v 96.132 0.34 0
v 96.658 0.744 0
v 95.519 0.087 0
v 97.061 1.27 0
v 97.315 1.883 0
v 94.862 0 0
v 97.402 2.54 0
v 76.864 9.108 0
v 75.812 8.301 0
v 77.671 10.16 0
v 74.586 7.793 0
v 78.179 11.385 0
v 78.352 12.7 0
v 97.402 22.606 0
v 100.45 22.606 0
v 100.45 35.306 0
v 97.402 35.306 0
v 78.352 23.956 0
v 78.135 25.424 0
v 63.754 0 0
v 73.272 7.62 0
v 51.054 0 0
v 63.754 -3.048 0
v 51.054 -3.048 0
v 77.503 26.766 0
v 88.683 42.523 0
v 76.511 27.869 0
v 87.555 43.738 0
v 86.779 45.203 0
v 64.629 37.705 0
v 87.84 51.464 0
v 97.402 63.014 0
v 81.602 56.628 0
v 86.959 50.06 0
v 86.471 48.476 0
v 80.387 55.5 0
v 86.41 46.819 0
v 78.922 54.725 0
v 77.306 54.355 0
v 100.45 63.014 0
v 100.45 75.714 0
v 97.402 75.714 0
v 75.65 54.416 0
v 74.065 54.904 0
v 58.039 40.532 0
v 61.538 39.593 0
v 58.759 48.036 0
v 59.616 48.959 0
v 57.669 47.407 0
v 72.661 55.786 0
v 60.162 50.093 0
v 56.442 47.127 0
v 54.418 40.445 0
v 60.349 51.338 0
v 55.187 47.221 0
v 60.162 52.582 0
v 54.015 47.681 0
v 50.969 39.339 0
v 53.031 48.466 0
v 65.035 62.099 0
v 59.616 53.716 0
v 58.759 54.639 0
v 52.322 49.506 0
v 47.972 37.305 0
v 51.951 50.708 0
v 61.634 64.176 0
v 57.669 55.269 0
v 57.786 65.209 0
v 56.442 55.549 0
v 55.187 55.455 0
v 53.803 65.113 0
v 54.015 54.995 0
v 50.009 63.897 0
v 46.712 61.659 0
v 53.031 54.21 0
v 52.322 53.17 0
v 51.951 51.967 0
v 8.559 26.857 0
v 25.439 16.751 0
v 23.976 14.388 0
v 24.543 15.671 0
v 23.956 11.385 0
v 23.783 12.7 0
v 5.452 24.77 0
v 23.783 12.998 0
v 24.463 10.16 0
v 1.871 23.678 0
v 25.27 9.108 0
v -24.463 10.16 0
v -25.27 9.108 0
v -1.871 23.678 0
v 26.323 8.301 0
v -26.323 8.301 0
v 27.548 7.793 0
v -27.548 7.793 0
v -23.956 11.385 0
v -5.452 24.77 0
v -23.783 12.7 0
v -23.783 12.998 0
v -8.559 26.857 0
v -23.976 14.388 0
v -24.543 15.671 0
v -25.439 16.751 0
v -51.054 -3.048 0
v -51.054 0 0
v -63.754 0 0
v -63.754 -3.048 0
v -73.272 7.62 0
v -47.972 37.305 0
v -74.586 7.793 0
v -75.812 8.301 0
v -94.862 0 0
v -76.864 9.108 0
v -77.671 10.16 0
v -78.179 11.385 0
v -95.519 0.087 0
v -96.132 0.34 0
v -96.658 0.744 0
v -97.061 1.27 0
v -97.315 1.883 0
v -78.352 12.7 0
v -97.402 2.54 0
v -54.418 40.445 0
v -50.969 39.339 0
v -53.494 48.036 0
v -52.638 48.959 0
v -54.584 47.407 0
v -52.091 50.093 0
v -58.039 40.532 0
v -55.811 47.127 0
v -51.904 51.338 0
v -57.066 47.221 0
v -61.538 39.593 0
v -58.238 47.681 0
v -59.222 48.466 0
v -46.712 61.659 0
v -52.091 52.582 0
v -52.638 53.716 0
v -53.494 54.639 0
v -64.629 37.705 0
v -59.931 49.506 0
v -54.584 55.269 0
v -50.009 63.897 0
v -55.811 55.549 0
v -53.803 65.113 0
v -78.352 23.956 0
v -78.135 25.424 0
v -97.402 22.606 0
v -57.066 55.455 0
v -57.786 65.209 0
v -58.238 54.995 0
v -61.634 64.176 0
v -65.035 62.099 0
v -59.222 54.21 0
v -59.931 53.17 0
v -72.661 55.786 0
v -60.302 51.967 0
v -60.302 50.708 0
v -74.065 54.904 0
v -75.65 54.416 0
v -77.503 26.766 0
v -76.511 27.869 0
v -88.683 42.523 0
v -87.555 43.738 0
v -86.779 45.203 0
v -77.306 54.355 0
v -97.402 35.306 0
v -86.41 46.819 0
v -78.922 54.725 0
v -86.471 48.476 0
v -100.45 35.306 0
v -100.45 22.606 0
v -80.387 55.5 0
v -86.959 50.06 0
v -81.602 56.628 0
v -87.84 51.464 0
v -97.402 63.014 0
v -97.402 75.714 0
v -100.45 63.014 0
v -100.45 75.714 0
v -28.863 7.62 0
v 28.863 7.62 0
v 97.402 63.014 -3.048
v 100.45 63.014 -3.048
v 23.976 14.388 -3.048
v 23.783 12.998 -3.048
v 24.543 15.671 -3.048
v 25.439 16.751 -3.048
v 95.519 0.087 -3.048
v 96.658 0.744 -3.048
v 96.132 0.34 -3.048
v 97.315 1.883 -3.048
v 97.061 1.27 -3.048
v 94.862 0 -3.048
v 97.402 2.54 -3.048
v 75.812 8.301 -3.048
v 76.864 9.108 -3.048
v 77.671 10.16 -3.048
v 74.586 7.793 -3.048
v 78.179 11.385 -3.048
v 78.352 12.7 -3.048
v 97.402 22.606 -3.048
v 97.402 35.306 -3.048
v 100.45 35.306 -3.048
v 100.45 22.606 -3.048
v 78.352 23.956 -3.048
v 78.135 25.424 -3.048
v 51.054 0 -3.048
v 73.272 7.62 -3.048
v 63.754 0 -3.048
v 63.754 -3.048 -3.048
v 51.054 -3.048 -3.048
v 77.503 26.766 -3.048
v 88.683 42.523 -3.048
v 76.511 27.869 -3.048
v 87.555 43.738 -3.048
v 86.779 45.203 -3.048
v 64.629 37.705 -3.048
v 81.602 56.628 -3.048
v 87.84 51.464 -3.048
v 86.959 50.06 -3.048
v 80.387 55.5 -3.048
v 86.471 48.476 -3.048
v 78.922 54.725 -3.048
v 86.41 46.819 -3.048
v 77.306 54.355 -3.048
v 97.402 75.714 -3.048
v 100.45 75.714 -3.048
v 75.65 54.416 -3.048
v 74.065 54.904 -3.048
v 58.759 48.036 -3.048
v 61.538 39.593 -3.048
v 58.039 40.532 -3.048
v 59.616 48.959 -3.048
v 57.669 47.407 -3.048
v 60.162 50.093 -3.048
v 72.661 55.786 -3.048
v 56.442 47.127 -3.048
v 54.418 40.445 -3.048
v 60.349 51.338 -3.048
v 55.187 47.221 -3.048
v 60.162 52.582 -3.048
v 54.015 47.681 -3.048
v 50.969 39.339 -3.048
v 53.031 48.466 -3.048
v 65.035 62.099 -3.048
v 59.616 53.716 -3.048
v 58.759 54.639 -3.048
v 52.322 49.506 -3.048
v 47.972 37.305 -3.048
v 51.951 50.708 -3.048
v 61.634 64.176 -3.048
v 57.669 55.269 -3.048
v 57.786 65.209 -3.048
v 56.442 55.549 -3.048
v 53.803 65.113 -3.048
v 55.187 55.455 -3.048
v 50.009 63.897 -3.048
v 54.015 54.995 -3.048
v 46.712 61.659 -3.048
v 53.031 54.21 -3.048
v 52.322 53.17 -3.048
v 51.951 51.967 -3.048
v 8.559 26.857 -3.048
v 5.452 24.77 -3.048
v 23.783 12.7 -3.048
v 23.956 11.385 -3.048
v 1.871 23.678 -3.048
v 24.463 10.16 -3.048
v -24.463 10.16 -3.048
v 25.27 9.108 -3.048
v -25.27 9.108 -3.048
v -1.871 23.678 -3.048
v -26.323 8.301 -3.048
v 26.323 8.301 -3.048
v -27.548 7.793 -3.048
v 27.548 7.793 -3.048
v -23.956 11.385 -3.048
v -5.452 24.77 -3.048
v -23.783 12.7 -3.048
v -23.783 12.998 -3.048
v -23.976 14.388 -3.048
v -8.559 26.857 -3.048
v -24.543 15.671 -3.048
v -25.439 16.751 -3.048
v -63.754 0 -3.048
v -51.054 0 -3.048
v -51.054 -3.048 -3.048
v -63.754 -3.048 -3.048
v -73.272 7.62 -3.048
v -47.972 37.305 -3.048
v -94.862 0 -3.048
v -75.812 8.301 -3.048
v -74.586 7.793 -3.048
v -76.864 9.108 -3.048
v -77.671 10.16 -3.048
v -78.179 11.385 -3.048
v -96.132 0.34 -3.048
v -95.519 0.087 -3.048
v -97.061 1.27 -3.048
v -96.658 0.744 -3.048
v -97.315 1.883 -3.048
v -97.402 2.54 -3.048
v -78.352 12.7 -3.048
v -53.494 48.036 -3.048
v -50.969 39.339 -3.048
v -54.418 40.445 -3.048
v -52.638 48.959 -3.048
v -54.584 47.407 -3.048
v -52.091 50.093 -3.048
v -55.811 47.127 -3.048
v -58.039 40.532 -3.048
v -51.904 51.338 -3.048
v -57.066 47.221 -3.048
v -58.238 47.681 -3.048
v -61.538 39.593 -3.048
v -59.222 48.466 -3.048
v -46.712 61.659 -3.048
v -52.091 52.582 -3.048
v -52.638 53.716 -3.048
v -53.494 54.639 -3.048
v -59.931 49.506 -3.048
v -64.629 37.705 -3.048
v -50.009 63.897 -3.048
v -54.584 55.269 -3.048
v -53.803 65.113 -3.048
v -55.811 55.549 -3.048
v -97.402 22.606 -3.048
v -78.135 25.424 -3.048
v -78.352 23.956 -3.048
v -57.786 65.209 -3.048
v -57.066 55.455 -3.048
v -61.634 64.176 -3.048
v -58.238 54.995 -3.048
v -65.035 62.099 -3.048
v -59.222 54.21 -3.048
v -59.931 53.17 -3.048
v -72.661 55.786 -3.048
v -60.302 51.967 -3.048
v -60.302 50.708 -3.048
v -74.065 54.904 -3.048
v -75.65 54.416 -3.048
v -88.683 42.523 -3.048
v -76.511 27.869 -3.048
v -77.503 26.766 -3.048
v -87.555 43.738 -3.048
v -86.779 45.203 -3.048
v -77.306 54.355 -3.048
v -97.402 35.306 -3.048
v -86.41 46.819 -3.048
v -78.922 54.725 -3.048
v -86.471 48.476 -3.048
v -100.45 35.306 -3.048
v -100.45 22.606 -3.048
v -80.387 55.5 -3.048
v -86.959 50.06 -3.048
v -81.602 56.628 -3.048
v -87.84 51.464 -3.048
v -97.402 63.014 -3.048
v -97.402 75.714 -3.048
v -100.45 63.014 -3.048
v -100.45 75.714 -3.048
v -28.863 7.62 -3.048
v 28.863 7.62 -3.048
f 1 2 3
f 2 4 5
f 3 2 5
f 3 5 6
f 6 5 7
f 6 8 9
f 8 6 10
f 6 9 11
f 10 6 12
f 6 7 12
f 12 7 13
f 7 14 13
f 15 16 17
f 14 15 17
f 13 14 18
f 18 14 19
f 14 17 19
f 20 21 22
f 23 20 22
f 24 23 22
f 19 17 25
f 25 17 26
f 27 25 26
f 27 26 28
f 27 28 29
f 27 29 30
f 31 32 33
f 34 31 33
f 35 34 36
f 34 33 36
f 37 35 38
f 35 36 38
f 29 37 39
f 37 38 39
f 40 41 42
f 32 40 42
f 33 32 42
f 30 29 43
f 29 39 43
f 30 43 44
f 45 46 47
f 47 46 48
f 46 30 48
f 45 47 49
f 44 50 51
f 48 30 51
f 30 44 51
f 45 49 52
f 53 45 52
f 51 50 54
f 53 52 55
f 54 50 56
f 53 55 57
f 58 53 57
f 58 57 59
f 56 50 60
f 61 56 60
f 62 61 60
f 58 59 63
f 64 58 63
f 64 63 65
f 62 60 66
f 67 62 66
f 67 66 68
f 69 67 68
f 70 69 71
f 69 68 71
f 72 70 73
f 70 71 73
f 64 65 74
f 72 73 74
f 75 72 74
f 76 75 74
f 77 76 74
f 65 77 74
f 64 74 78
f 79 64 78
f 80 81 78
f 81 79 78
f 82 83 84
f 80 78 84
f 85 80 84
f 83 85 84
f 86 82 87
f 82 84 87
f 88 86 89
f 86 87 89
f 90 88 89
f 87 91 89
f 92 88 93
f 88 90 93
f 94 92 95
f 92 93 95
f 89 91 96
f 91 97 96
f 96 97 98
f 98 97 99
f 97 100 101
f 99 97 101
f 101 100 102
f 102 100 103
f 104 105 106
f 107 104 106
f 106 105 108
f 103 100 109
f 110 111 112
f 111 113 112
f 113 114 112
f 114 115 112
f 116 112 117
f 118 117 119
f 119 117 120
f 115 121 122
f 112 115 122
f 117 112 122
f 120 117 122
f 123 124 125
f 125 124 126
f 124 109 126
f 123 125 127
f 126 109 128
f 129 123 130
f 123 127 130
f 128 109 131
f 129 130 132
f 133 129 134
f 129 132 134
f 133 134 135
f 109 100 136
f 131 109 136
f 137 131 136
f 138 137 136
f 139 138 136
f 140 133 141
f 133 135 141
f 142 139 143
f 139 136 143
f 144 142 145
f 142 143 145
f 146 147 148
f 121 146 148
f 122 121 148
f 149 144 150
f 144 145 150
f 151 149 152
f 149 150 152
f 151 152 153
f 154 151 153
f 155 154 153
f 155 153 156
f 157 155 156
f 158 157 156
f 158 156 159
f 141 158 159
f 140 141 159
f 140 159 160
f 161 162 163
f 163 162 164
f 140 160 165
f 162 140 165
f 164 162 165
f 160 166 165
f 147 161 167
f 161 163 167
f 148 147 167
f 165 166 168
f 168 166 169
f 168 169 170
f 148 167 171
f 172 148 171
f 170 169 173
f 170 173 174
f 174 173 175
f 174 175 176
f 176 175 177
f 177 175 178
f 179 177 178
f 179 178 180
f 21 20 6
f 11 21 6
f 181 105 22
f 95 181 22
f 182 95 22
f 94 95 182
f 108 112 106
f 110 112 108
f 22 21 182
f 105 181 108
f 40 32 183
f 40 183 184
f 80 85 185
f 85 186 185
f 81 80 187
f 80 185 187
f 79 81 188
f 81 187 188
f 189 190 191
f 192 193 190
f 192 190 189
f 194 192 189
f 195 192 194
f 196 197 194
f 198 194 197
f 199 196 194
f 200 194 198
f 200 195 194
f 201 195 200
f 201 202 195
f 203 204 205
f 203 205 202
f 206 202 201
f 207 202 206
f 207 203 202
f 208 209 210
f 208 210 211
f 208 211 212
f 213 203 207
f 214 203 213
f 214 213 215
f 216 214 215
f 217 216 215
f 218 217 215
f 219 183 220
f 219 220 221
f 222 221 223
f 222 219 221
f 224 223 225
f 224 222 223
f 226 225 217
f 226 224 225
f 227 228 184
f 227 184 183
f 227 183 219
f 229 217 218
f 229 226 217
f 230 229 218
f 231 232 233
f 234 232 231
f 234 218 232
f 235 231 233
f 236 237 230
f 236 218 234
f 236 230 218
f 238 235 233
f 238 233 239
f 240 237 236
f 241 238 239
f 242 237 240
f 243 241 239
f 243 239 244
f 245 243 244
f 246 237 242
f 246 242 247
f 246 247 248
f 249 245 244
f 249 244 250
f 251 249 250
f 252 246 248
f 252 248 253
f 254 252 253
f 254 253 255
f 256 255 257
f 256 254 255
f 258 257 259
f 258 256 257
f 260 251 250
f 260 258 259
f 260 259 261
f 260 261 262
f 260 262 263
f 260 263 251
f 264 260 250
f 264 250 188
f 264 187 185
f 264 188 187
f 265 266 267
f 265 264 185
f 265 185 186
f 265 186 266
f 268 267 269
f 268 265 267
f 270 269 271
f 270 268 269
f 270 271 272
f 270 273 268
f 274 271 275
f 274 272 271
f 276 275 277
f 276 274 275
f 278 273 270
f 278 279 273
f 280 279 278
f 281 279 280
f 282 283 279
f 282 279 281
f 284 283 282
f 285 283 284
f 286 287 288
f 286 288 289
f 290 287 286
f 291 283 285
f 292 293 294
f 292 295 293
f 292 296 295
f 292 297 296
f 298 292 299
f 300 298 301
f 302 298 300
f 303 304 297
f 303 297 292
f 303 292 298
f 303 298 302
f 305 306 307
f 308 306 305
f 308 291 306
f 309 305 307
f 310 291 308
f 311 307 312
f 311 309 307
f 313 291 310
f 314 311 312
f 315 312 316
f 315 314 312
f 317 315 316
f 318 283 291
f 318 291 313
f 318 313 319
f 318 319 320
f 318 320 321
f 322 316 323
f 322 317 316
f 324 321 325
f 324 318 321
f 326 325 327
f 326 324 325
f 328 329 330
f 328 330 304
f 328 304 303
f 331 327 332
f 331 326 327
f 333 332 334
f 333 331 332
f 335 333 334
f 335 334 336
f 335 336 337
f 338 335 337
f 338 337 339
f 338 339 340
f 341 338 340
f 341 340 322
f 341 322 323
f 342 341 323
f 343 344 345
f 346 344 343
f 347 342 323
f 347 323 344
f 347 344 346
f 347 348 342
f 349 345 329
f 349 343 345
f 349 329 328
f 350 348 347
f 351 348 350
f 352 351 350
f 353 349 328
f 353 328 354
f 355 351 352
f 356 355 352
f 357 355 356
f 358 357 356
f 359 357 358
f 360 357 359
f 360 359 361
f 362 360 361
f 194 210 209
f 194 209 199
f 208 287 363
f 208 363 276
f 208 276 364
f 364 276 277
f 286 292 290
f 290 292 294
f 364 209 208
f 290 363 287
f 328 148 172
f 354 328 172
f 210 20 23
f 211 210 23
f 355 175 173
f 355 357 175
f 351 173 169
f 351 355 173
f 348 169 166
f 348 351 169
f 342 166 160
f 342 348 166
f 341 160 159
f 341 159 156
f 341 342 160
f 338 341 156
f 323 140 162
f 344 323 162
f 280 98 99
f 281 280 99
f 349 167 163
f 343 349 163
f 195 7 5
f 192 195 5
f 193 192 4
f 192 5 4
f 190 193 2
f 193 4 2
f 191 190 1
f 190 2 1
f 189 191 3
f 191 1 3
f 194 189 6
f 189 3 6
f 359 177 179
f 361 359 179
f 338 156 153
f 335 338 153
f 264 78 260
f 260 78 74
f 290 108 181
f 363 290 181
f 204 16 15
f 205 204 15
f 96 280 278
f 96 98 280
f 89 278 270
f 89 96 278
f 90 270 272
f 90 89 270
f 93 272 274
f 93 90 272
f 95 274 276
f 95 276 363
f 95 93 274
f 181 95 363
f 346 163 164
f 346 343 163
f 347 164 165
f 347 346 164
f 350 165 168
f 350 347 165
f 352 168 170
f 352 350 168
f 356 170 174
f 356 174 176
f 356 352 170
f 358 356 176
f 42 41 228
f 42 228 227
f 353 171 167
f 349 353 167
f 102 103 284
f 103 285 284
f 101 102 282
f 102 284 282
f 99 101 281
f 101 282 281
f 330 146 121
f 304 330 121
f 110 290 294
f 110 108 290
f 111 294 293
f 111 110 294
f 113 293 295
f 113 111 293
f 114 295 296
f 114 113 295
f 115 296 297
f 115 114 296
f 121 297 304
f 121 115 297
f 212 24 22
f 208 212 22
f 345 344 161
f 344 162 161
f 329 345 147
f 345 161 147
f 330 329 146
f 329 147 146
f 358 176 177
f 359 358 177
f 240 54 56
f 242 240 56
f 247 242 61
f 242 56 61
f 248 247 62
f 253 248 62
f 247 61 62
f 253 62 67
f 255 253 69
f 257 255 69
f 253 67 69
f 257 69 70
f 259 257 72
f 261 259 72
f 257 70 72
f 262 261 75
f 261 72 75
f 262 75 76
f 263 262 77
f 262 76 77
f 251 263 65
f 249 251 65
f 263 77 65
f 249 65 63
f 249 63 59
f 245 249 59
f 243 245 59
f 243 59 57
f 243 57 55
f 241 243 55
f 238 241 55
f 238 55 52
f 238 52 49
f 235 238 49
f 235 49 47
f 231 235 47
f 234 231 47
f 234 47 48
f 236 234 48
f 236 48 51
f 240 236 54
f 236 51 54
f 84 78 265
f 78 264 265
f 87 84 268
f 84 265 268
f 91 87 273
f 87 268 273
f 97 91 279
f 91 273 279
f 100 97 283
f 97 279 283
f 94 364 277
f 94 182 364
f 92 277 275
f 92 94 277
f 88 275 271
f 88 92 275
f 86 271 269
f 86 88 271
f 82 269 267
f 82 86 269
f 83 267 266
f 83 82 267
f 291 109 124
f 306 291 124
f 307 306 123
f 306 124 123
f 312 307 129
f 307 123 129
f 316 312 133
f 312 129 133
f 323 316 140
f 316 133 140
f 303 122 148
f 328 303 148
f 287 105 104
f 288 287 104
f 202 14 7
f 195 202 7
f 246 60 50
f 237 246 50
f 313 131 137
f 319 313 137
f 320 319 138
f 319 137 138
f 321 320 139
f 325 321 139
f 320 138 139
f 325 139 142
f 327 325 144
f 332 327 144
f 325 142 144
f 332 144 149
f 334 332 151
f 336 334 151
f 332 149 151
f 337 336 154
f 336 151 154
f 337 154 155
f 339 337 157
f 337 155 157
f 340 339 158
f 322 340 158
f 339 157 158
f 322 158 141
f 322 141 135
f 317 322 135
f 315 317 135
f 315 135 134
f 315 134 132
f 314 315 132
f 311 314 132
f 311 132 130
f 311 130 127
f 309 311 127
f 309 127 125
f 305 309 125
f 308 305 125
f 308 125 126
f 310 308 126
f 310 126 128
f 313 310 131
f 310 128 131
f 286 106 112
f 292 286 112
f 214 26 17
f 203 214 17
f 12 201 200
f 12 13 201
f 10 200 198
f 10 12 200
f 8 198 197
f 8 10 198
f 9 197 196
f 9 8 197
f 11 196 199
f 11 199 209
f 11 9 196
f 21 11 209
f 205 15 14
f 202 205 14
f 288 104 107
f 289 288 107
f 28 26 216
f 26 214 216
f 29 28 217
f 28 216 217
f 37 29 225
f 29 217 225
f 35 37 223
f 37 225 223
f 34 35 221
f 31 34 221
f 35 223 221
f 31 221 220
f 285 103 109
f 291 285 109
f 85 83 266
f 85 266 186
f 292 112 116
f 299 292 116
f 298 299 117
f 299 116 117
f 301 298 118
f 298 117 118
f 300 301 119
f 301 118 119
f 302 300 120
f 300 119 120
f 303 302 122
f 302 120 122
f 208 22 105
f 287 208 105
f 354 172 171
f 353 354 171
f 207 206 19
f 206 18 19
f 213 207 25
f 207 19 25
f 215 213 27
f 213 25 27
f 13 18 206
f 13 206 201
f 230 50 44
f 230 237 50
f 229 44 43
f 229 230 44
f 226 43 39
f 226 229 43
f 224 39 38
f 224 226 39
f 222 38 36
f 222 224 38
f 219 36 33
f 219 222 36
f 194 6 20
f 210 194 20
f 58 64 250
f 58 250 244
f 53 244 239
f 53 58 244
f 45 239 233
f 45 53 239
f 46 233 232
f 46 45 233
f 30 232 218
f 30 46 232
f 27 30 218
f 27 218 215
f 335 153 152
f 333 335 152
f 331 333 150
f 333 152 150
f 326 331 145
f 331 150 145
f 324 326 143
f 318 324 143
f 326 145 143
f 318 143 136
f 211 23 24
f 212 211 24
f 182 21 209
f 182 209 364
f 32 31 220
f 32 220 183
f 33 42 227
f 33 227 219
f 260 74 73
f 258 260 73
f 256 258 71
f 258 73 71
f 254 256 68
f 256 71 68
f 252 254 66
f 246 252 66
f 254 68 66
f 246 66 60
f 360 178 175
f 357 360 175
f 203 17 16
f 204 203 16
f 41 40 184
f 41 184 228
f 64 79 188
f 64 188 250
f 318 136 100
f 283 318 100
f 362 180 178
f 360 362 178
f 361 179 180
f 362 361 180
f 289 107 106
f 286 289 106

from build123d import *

# Parameters (mm, degrees)
SKETCH1_R            = 4.22275
BOSS_EXTRUDE1_DEPTH  = 3.048
FILLET1_R            = 12.7
CUT_EXTRUDE1_DEPTH   = 120.852046006
FILLET2_R            = 5.08
FILLET2_OF_MIRROR1_R = 5.08
BOSS_EXTRUDE2_DEPTH  = 3.048
FILLET4_R            = 6.35


with BuildPart() as part:
    # Sketch1 → Boss-Extrude1 (new body)
    with BuildSketch(Plane.XY):
        with BuildLine():
            Line((51.054, 0), (-51.054, 0))
            Line((-51.054, 0), (-51.054, -3.048))
            Line((-51.054, -3.048), (-63.754, -3.048))
            Line((-63.754, -3.048), (-63.754, 0))
            Line((-63.754, 0), (-94.861600757, 0))
            ThreePointArc((-94.861600757, 0), (-96.657651981, 0.743948776), (-97.401600757, 2.54))
            Line((-97.401600757, 2.54), (-97.401600757, 22.606))
            Line((-97.401600757, 22.606), (-100.449600757, 22.606))
            Line((-100.449600757, 22.606), (-100.449600757, 35.306))
            Line((-100.449600757, 35.306), (-97.401600757, 35.306))
            Line((-97.401600757, 35.306), (-65.034740931, 62.09905242))
            ThreePointArc((-65.034740931, 62.09905242), (-55.791114337, 65.303706753), (-46.712023238, 61.658909525))
            Line((-46.712023238, 61.658909525), (0, 19.05))
            Line((0, 19.05), (46.712023238, 61.658909525))
            ThreePointArc((46.712023238, 61.658909525), (55.791114337, 65.303706753), (65.034740931, 62.09905242))
            Line((65.034740931, 62.09905242), (97.401600757, 35.306))
            Line((97.401600757, 35.306), (100.449600757, 35.306))
            Line((100.449600757, 35.306), (100.449600757, 22.606))
            Line((100.449600757, 22.606), (97.401600757, 22.606))
            Line((97.401600757, 22.606), (97.401600757, 2.54))
            ThreePointArc((97.401600757, 2.54), (96.657651981, 0.743948776), (94.861600757, 0))
            Line((94.861600757, 0), (63.754, 0))
            Line((63.754, 0), (63.754, -3.048))
            Line((63.754, -3.048), (51.054, -3.048))
            Line((51.054, -3.048), (51.054, 0))
        make_face()
        with Locations((56.126600757, 51.33773565)):
            Circle(SKETCH1_R, mode=Mode.SUBTRACT)
        with Locations((-56.126600757, 51.33773565)):
            Circle(SKETCH1_R, mode=Mode.SUBTRACT)
    extrude(amount=-BOSS_EXTRUDE1_DEPTH)

    # Fillet1
    fillet1_edges = [part.edges().sort_by_distance(p)[0] for p in [
        (0, 19.05, -1.524),
    ]]
    fillet(fillet1_edges, radius=FILLET1_R)

    # Sketch3 → Cut-Extrude1 (cut, symmetric)
    with BuildSketch(Plane.XY):
        with BuildLine():
            Line((-64.628984538, 37.704829039), (-78.351600757, 26.345346603))
            Line((-78.351600757, 26.345346603), (-78.351600757, 7.62))
            Line((-78.351600757, 7.62), (-23.782503148, 7.62))
            Line((-23.782503148, 7.62), (-23.782503148, 15.24))
            Line((-23.782503148, 15.24), (-47.971968454, 37.304699134))
            ThreePointArc((-47.971968454, 37.304699134), (-56.225687634, 40.61815116), (-64.628984538, 37.704829039))
        make_face()
    cut_extrude1 = extrude(amount=CUT_EXTRUDE1_DEPTH, both=True, mode=Mode.SUBTRACT)

    # Fillet2
    fillet2_edges = [part.edges().sort_by_distance(p)[0] for p in [
        (-23.782503148, 15.24, -1.524),
        (-23.782503148, 7.62, -1.524),
        (-78.351600757, 7.62, -1.524),
        (-78.351600757, 26.345346603, -1.524),
    ]]
    fillet(fillet2_edges, radius=FILLET2_R)

    # Mirror1: Cut-Extrude1 across plane
    add(cut_extrude1.mirror(Plane(origin=(0, 0, 0), x_dir=(0, 0, 1), z_dir=(1, 0, 0))), mode=Mode.SUBTRACT)

    # Fillet2 of Mirror1
    fillet2_of_mirror1_edges = [part.edges().sort_by_distance(p)[0] for p in [
        (23.782503148, 15.24, -1.524),
        (23.782503148, 7.62, -1.524),
        (78.351600757, 7.62, -1.524),
        (78.351600757, 26.345346603, -1.524),
    ]]
    fillet(fillet2_of_mirror1_edges, radius=FILLET2_OF_MIRROR1_R)

    # Sketch4 → Boss-Extrude2 (add)
    with BuildSketch(Plane.XY):
        Polygon((-97.401600757, 75.714336407), (-77.552967075, 51.736555375), (-83.791225568, 46.572570123), (-97.401600757, 63.014336407), (-100.449600757, 63.014336407), (-100.449600757, 75.714336407), align=None)
    boss_extrude2 = extrude(amount=-BOSS_EXTRUDE2_DEPTH)

    # Mirror3: Boss-Extrude2 across plane
    add(boss_extrude2.mirror(Plane(origin=(0, 0, 0), x_dir=(0, 0, 1), z_dir=(1, 0, 0))))

    # Fillet4
    fillet4_edges = [part.edges().sort_by_distance(p)[0] for p in [
        (-77.552967075, 51.736555375, -1.524),
        (-83.791225568, 46.572570123, -1.524),
        (77.552967075, 51.736555375, -1.524),
        (83.791225568, 46.572570123, -1.524),
    ]]
    fillet(fillet4_edges, radius=FILLET4_R)


solid = part.part
